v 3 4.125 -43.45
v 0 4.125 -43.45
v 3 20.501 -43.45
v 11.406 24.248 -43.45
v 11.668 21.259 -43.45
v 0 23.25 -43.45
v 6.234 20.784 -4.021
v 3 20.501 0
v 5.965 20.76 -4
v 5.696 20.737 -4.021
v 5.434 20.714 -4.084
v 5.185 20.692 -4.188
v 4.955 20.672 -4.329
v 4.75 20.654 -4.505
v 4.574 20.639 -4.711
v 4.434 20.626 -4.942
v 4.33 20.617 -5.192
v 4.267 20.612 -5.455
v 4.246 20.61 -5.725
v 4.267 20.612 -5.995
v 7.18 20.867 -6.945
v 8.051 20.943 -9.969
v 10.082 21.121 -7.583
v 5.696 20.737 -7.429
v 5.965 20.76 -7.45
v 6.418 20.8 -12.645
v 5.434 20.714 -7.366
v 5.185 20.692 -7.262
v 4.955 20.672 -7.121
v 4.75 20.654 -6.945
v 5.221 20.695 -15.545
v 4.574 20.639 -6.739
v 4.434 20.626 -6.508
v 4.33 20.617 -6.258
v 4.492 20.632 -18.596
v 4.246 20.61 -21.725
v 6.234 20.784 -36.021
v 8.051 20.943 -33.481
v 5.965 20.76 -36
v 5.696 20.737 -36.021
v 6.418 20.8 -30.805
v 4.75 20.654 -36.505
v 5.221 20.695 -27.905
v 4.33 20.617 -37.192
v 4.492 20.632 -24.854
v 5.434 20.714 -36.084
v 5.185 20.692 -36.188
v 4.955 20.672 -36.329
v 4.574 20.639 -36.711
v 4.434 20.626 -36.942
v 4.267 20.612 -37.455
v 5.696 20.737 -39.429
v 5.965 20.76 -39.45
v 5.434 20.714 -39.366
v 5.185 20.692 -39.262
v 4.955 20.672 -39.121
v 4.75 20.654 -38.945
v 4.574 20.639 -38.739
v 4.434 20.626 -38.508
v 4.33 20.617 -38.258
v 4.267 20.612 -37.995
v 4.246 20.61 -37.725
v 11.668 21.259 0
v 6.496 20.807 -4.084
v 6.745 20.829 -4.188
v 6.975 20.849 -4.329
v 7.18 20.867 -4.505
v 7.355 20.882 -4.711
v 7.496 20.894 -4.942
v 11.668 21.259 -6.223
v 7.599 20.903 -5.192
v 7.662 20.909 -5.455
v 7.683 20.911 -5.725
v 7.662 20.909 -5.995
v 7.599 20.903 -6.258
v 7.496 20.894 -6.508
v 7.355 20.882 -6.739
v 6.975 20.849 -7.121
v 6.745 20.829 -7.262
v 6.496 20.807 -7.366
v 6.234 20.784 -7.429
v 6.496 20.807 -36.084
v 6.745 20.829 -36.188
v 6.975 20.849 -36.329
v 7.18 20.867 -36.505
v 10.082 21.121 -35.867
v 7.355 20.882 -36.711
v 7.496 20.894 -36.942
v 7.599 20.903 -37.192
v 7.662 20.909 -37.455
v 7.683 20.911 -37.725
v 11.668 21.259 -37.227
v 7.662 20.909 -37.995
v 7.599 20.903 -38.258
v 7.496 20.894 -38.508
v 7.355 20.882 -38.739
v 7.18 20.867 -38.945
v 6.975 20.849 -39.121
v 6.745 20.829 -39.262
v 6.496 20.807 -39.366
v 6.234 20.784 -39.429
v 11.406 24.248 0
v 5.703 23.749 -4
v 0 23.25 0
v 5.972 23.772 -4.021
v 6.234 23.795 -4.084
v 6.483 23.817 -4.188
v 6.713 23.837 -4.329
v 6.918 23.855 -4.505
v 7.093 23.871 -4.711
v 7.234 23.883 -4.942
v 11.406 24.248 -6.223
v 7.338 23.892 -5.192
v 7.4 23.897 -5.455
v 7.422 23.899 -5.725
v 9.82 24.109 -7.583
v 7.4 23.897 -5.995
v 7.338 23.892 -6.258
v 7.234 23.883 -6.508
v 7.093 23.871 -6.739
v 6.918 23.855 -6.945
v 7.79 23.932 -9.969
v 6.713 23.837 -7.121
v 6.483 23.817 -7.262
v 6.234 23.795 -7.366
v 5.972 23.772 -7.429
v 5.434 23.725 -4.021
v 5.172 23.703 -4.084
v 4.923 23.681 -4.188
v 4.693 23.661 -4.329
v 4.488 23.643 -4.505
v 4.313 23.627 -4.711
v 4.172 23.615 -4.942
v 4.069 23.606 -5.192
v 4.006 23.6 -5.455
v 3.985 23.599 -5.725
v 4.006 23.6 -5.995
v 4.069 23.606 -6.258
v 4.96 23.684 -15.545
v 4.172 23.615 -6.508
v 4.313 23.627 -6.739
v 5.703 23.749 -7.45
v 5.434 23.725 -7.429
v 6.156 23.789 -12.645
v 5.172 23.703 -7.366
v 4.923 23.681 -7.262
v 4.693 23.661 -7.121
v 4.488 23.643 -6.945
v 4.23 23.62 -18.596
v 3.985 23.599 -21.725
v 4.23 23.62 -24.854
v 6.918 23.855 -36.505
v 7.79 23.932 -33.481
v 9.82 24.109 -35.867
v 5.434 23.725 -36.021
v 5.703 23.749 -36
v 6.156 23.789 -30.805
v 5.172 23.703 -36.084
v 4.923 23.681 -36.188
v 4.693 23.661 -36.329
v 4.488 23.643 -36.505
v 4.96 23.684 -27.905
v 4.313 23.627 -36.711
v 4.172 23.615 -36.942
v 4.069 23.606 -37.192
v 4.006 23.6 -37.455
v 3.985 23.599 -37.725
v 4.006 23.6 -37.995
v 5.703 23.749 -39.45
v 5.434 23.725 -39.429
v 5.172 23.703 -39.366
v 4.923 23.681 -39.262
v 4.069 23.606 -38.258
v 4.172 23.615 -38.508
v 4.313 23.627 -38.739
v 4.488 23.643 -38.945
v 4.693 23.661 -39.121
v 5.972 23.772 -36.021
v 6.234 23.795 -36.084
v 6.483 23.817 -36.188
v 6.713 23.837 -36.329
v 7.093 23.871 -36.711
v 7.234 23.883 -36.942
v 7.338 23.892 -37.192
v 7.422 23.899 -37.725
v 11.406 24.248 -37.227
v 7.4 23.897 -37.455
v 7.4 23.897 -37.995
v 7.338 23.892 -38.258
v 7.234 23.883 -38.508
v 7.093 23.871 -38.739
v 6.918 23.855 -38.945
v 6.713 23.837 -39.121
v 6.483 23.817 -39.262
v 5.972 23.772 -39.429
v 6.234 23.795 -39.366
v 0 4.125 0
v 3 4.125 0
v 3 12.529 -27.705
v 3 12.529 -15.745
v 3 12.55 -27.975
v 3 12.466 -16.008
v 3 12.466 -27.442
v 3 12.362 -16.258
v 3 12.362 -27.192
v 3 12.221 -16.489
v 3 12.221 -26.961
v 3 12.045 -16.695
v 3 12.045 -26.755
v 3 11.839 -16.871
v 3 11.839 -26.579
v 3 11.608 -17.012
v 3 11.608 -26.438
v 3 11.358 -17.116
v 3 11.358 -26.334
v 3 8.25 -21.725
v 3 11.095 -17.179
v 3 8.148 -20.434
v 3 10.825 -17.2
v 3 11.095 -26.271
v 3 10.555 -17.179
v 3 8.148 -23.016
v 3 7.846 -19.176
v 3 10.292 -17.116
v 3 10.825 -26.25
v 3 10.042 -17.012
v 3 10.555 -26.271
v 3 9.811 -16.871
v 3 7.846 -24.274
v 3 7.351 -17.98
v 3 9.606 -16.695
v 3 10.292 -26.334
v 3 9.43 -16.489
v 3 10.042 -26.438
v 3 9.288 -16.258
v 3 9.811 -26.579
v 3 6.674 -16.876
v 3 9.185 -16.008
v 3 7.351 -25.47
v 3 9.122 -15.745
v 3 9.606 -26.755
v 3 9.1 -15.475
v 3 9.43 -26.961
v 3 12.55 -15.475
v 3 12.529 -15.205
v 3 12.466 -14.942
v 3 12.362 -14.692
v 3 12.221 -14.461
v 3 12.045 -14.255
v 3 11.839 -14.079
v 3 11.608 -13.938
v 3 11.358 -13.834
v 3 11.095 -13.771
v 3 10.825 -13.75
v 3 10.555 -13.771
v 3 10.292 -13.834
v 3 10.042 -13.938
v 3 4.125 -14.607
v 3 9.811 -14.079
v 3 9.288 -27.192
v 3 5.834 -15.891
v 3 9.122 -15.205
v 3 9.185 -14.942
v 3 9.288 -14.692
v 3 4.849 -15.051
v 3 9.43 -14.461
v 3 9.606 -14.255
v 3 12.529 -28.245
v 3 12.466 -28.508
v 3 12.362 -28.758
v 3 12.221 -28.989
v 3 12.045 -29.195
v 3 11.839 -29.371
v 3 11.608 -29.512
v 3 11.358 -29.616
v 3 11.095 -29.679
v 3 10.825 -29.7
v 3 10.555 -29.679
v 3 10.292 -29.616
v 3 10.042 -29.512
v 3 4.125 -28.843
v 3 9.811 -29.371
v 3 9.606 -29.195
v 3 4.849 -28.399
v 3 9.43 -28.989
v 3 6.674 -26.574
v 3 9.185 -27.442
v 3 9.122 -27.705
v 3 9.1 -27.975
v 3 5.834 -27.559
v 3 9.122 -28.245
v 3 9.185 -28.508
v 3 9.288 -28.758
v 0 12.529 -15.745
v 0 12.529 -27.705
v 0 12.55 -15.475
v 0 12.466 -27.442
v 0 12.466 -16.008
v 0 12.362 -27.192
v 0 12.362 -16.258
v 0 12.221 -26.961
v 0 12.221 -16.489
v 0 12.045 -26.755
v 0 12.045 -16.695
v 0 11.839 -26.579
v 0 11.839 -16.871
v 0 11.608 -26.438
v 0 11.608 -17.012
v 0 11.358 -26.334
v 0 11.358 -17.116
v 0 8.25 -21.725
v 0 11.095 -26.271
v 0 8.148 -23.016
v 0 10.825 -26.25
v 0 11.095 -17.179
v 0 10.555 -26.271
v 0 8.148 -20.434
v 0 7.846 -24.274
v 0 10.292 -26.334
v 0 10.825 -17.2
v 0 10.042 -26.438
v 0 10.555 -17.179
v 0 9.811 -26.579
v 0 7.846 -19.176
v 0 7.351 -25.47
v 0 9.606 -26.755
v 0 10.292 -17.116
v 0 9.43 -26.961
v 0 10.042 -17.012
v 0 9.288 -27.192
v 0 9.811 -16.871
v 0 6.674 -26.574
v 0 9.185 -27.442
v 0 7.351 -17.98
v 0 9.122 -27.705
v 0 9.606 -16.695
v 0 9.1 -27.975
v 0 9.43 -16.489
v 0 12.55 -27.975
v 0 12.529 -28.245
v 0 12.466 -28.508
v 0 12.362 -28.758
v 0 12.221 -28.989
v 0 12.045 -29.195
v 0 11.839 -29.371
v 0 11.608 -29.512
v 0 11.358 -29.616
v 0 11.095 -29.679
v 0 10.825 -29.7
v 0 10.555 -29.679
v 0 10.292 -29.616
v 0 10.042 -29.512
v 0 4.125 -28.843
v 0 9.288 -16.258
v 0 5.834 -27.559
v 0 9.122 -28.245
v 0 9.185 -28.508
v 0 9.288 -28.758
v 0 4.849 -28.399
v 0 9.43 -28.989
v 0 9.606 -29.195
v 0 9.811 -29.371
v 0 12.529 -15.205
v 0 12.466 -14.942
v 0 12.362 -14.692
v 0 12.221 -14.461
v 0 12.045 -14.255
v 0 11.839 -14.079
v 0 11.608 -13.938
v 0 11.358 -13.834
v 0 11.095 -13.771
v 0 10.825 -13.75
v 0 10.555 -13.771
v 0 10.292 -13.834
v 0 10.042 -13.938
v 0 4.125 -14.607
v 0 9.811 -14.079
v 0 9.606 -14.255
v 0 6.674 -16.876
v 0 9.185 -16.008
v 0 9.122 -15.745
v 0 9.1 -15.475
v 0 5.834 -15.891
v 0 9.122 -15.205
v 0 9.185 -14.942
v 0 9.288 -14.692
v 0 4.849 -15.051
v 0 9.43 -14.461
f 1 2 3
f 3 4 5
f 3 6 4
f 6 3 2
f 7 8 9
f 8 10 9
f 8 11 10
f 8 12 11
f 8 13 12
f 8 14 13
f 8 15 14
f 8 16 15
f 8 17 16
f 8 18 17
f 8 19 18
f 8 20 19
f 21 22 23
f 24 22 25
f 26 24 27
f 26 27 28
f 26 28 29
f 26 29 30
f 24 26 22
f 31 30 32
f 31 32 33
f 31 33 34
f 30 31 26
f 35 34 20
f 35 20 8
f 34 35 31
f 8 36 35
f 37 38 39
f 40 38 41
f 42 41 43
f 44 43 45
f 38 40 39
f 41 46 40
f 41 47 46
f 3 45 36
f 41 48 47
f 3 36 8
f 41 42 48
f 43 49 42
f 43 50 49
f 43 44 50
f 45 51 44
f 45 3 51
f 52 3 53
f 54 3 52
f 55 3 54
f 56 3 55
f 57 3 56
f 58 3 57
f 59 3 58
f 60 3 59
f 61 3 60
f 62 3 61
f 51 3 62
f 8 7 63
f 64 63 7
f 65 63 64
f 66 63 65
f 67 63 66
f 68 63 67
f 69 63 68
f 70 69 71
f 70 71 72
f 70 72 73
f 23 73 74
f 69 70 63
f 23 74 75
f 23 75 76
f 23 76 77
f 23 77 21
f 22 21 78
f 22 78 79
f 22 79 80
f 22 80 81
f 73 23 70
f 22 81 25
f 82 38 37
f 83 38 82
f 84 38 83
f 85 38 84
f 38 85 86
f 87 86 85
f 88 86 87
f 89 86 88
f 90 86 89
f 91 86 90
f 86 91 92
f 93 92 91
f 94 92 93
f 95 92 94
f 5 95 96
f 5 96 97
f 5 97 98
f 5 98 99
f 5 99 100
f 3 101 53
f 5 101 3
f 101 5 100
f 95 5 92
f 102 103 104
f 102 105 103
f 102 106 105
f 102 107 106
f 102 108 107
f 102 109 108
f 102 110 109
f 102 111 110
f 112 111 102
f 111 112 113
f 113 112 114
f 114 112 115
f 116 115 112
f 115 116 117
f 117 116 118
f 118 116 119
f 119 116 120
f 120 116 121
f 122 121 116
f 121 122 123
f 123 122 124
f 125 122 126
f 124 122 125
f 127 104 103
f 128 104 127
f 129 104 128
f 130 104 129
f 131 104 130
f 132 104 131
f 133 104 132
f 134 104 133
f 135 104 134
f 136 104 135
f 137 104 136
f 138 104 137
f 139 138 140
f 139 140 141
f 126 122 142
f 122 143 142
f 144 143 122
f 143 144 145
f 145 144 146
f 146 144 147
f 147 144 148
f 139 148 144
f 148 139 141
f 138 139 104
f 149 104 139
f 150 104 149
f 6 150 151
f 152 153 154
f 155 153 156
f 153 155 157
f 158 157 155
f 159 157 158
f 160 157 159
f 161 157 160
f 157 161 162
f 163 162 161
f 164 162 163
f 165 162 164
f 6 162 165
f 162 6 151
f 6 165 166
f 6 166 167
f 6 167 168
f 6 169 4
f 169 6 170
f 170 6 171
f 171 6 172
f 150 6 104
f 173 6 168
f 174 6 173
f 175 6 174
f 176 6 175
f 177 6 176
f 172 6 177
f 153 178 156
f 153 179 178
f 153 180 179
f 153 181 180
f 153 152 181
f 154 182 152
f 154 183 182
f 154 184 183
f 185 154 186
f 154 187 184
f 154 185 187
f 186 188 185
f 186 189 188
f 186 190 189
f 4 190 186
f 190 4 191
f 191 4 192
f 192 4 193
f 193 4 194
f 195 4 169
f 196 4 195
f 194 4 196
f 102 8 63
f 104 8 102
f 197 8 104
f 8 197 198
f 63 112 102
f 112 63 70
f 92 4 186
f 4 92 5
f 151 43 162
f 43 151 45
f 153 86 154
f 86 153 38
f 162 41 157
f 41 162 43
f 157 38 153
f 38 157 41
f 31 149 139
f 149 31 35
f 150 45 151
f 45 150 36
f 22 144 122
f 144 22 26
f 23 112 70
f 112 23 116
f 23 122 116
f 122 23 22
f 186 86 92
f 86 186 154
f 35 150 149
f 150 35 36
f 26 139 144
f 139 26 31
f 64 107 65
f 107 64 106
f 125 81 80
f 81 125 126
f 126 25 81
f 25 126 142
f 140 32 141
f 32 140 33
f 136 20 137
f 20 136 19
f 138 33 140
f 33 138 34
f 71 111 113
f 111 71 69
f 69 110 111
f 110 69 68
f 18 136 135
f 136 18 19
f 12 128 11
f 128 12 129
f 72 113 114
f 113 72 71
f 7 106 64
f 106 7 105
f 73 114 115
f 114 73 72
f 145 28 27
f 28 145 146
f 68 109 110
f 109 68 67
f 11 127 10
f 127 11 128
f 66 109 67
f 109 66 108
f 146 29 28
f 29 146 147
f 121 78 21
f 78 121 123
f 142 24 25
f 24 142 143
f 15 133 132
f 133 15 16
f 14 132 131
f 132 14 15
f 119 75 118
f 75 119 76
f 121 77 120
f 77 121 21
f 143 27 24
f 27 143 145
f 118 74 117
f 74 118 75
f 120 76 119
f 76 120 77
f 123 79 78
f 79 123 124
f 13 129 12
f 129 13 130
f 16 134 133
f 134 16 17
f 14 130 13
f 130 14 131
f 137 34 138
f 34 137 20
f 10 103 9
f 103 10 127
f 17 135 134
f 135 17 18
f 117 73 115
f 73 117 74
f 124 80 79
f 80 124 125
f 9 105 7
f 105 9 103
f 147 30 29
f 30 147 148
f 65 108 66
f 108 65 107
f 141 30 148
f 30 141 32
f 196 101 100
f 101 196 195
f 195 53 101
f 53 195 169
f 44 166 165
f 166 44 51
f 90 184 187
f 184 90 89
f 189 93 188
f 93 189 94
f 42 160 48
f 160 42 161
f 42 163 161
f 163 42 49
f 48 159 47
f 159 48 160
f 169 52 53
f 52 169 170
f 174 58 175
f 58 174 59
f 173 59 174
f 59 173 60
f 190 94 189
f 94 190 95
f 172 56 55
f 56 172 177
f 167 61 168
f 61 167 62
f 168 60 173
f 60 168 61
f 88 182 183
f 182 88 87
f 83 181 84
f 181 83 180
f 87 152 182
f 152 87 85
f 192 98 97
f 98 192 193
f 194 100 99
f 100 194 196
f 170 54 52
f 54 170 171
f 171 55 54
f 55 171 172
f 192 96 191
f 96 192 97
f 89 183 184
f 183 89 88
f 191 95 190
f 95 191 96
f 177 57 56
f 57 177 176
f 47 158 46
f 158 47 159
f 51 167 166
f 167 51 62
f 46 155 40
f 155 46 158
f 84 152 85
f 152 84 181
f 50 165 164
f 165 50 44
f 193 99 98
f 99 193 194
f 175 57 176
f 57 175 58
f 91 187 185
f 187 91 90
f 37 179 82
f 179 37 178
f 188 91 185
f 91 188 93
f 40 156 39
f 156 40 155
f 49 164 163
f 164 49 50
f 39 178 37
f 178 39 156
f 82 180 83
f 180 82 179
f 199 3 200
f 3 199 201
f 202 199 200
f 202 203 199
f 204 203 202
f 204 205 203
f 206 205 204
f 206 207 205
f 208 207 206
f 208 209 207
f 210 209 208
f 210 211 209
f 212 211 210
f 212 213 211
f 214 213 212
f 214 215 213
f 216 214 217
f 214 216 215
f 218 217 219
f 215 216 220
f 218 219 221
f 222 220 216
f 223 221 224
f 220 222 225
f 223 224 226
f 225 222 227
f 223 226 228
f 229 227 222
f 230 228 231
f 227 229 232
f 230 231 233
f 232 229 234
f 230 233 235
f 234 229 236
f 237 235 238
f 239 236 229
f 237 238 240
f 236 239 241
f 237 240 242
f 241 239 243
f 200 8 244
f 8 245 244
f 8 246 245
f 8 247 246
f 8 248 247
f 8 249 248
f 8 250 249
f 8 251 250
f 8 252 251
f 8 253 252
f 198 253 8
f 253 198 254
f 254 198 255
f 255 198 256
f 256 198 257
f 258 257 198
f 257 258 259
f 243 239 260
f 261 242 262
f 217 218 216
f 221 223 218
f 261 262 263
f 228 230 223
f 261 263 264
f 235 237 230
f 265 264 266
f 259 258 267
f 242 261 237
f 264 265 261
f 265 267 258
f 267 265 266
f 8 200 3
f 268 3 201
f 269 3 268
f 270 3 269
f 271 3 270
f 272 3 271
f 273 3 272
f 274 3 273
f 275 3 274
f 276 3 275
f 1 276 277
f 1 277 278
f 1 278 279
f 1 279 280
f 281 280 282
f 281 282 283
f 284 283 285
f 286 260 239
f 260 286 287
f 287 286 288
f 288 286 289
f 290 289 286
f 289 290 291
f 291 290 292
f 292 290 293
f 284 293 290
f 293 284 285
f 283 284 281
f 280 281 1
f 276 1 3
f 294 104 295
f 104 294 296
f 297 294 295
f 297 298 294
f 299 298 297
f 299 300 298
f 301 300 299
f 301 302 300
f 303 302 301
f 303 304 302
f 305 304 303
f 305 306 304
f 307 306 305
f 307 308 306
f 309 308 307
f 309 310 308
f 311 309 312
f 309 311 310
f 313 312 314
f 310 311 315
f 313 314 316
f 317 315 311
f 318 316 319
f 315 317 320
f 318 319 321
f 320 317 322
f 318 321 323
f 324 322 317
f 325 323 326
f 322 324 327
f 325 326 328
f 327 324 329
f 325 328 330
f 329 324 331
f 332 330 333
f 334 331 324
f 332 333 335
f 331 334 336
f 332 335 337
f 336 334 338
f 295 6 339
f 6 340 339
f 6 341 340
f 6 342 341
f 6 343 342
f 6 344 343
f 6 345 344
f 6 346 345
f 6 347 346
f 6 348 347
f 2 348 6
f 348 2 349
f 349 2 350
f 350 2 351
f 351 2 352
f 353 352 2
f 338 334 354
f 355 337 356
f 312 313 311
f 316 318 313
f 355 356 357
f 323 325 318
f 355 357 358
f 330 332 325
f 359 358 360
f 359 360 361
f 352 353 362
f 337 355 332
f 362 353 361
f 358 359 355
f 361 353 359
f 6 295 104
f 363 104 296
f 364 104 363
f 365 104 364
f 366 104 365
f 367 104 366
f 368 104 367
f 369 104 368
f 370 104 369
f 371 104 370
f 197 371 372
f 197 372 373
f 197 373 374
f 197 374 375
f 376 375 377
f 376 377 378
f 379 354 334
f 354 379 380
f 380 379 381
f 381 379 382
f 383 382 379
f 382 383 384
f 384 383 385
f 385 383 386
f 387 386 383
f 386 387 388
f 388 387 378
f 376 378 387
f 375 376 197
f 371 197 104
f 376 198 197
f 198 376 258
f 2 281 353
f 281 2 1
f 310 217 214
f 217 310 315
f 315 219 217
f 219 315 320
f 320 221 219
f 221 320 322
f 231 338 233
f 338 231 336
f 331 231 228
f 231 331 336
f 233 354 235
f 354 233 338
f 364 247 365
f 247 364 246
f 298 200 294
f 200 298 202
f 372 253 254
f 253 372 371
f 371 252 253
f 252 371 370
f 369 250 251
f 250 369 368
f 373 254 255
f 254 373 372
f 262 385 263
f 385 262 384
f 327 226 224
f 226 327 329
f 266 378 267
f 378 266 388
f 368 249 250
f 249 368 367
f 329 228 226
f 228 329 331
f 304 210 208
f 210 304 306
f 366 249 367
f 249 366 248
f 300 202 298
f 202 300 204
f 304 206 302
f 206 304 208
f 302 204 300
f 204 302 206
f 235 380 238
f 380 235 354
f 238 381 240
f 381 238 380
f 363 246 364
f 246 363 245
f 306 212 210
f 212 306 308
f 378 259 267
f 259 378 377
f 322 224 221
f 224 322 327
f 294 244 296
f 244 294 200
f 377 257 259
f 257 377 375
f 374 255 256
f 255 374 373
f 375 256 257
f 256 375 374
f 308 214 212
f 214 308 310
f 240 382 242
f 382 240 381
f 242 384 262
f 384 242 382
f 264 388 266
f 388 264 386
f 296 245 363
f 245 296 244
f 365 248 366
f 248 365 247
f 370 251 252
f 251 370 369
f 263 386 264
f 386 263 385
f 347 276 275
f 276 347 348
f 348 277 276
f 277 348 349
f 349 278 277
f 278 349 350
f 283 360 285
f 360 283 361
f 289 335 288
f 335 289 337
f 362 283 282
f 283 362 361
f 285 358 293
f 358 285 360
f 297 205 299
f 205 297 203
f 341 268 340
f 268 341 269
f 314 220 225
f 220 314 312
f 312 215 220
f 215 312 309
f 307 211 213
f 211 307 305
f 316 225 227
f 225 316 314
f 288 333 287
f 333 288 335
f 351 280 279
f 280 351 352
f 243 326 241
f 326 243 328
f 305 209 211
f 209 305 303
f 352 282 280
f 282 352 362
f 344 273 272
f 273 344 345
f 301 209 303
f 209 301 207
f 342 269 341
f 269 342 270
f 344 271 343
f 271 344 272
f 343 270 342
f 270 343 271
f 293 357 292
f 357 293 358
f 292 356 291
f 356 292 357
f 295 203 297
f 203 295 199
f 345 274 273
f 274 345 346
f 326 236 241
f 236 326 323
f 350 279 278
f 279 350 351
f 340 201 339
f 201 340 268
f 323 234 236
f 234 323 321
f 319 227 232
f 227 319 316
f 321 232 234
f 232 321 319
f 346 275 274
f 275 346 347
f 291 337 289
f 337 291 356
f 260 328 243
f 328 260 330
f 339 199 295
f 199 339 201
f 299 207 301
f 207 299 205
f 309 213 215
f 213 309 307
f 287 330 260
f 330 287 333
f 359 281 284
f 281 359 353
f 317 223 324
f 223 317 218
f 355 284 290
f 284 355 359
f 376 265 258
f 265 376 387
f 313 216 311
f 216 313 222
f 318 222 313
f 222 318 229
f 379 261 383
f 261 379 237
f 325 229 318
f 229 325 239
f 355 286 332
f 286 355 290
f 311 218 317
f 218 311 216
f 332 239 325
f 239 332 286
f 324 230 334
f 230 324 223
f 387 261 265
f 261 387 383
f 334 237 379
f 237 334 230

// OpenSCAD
// file: configuration.scad
// Increase this if your slicer or printer make holes too tight.
extra_radius = 0.1;

// OD = outside diameter, corner to corner.
m3_nut_od = 6.1;
m3_nut_radius = m3_nut_od/2 + 0.2 + extra_radius;
m3_washer_radius = 3.5 + extra_radius;

// Major diameter of metric 3mm thread.
m3_major = 2.85;
m3_radius = m3_major/2 + extra_radius;
m3_wide_radius = m3_major/2 + extra_radius + 0.2;

// NEMA17 stepper motors.
motor_shaft_diameter = 5;
motor_shaft_radius = motor_shaft_diameter/2 + extra_radius;

// Frame brackets. M3x8mm screws work best with 3.6 mm brackets.
thickness = 3.6;

// OpenBeam or Misumi. Currently only 15x15 mm, but there is a plan
// to make models more parametric and allow 20x20 mm in the future.
extrusion = 20;

extrusion_channel_w = 5; //use 3 for 1515
extrusion_channel_d = 3; //use 3 for 1515
extrusion_fin_d = 1;

vertex_radius = 40.5; //set to 36 for 1515
vertex_x_offset = 7.25; // offset of the horizontal extrusion to the vertical one in X axis
vertex_y_offset = 39 ;//27; // offset of the horizontal extrusion to the vertical one in Y axis

// Placement for the NEMA17 stepper motors.
motor_offset = 44;
motor_length = 47;
// main file
include <configuration.scad>;

// Input parameters
mount_thickness = 3;                             // Overall thickness (mm)
mount_angle = 85;                                // Angle to mount the fan at (degrees),default is 45
hole_radius = 12.5;                              // Radius at which the effector mount holes are made (mm)
effector_offset = 15;                            // Length of the side that offsets the fan from the effector (mm)
fan_radius = 20;                                 // overall fan radius, e.g. 40mm fan = 20 (mm)
fan_hole_pitch = 32;                             // pitch of the fan mounting holes (mm)
hole_offset = 4;                                 // space between thru holes and edges (mm),default is 2mm
hotend_radius = 8 + 0.25;                        // Radius of the hotend + buffer (mm)

// Calculated parameters
bracket_length = 2*(hole_offset+m3_wide_radius);                // Length of the angled portion (mm)
bracket_width = fan_hole_pitch+2*(hole_offset+m3_wide_radius);  // Overall bracket width (mm)

$fn = 40;

rotate(a=90, v=[0,1,0]) // print on its side for a strong angle joint
difference() {
  union() {
    translate([0, hotend_radius+effector_offset, 0])
    rotate(a=mount_angle, v=[1,0,0])
      difference() {
        cube([bracket_width, bracket_length, mount_thickness]);
        translate([bracket_width/2, fan_radius+hole_offset, 0])
          cylinder(r=fan_radius, h=mount_thickness);

        // Fan mounting holes
        translate([m3_wide_radius+hole_offset, m3_wide_radius+hole_offset, 0])
          cylinder(r=m3_wide_radius, h=mount_thickness);
        translate([bracket_width-m3_wide_radius-hole_offset, m3_wide_radius+hole_offset, 0])
          cylinder(r=m3_wide_radius, h=mount_thickness);
    }

    // Effector mounting side
    translate([0, hotend_radius/2, 0])
      cube([bracket_width, effector_offset+hotend_radius/2, mount_thickness]);
  }

  // Thru holes
  for (hole_angle = [-30:60:30]) {
    translate([bracket_width/2, 0, 0])
      translate([sin(hole_angle)*hole_radius,cos(hole_angle)*hole_radius,0])
      cylinder(r=m3_wide_radius, h=mount_thickness);
  }

  // Thru hole for hotend
  translate([bracket_width/2, 0, 0])
      cylinder(r=hotend_radius, h=mount_thickness);
};
